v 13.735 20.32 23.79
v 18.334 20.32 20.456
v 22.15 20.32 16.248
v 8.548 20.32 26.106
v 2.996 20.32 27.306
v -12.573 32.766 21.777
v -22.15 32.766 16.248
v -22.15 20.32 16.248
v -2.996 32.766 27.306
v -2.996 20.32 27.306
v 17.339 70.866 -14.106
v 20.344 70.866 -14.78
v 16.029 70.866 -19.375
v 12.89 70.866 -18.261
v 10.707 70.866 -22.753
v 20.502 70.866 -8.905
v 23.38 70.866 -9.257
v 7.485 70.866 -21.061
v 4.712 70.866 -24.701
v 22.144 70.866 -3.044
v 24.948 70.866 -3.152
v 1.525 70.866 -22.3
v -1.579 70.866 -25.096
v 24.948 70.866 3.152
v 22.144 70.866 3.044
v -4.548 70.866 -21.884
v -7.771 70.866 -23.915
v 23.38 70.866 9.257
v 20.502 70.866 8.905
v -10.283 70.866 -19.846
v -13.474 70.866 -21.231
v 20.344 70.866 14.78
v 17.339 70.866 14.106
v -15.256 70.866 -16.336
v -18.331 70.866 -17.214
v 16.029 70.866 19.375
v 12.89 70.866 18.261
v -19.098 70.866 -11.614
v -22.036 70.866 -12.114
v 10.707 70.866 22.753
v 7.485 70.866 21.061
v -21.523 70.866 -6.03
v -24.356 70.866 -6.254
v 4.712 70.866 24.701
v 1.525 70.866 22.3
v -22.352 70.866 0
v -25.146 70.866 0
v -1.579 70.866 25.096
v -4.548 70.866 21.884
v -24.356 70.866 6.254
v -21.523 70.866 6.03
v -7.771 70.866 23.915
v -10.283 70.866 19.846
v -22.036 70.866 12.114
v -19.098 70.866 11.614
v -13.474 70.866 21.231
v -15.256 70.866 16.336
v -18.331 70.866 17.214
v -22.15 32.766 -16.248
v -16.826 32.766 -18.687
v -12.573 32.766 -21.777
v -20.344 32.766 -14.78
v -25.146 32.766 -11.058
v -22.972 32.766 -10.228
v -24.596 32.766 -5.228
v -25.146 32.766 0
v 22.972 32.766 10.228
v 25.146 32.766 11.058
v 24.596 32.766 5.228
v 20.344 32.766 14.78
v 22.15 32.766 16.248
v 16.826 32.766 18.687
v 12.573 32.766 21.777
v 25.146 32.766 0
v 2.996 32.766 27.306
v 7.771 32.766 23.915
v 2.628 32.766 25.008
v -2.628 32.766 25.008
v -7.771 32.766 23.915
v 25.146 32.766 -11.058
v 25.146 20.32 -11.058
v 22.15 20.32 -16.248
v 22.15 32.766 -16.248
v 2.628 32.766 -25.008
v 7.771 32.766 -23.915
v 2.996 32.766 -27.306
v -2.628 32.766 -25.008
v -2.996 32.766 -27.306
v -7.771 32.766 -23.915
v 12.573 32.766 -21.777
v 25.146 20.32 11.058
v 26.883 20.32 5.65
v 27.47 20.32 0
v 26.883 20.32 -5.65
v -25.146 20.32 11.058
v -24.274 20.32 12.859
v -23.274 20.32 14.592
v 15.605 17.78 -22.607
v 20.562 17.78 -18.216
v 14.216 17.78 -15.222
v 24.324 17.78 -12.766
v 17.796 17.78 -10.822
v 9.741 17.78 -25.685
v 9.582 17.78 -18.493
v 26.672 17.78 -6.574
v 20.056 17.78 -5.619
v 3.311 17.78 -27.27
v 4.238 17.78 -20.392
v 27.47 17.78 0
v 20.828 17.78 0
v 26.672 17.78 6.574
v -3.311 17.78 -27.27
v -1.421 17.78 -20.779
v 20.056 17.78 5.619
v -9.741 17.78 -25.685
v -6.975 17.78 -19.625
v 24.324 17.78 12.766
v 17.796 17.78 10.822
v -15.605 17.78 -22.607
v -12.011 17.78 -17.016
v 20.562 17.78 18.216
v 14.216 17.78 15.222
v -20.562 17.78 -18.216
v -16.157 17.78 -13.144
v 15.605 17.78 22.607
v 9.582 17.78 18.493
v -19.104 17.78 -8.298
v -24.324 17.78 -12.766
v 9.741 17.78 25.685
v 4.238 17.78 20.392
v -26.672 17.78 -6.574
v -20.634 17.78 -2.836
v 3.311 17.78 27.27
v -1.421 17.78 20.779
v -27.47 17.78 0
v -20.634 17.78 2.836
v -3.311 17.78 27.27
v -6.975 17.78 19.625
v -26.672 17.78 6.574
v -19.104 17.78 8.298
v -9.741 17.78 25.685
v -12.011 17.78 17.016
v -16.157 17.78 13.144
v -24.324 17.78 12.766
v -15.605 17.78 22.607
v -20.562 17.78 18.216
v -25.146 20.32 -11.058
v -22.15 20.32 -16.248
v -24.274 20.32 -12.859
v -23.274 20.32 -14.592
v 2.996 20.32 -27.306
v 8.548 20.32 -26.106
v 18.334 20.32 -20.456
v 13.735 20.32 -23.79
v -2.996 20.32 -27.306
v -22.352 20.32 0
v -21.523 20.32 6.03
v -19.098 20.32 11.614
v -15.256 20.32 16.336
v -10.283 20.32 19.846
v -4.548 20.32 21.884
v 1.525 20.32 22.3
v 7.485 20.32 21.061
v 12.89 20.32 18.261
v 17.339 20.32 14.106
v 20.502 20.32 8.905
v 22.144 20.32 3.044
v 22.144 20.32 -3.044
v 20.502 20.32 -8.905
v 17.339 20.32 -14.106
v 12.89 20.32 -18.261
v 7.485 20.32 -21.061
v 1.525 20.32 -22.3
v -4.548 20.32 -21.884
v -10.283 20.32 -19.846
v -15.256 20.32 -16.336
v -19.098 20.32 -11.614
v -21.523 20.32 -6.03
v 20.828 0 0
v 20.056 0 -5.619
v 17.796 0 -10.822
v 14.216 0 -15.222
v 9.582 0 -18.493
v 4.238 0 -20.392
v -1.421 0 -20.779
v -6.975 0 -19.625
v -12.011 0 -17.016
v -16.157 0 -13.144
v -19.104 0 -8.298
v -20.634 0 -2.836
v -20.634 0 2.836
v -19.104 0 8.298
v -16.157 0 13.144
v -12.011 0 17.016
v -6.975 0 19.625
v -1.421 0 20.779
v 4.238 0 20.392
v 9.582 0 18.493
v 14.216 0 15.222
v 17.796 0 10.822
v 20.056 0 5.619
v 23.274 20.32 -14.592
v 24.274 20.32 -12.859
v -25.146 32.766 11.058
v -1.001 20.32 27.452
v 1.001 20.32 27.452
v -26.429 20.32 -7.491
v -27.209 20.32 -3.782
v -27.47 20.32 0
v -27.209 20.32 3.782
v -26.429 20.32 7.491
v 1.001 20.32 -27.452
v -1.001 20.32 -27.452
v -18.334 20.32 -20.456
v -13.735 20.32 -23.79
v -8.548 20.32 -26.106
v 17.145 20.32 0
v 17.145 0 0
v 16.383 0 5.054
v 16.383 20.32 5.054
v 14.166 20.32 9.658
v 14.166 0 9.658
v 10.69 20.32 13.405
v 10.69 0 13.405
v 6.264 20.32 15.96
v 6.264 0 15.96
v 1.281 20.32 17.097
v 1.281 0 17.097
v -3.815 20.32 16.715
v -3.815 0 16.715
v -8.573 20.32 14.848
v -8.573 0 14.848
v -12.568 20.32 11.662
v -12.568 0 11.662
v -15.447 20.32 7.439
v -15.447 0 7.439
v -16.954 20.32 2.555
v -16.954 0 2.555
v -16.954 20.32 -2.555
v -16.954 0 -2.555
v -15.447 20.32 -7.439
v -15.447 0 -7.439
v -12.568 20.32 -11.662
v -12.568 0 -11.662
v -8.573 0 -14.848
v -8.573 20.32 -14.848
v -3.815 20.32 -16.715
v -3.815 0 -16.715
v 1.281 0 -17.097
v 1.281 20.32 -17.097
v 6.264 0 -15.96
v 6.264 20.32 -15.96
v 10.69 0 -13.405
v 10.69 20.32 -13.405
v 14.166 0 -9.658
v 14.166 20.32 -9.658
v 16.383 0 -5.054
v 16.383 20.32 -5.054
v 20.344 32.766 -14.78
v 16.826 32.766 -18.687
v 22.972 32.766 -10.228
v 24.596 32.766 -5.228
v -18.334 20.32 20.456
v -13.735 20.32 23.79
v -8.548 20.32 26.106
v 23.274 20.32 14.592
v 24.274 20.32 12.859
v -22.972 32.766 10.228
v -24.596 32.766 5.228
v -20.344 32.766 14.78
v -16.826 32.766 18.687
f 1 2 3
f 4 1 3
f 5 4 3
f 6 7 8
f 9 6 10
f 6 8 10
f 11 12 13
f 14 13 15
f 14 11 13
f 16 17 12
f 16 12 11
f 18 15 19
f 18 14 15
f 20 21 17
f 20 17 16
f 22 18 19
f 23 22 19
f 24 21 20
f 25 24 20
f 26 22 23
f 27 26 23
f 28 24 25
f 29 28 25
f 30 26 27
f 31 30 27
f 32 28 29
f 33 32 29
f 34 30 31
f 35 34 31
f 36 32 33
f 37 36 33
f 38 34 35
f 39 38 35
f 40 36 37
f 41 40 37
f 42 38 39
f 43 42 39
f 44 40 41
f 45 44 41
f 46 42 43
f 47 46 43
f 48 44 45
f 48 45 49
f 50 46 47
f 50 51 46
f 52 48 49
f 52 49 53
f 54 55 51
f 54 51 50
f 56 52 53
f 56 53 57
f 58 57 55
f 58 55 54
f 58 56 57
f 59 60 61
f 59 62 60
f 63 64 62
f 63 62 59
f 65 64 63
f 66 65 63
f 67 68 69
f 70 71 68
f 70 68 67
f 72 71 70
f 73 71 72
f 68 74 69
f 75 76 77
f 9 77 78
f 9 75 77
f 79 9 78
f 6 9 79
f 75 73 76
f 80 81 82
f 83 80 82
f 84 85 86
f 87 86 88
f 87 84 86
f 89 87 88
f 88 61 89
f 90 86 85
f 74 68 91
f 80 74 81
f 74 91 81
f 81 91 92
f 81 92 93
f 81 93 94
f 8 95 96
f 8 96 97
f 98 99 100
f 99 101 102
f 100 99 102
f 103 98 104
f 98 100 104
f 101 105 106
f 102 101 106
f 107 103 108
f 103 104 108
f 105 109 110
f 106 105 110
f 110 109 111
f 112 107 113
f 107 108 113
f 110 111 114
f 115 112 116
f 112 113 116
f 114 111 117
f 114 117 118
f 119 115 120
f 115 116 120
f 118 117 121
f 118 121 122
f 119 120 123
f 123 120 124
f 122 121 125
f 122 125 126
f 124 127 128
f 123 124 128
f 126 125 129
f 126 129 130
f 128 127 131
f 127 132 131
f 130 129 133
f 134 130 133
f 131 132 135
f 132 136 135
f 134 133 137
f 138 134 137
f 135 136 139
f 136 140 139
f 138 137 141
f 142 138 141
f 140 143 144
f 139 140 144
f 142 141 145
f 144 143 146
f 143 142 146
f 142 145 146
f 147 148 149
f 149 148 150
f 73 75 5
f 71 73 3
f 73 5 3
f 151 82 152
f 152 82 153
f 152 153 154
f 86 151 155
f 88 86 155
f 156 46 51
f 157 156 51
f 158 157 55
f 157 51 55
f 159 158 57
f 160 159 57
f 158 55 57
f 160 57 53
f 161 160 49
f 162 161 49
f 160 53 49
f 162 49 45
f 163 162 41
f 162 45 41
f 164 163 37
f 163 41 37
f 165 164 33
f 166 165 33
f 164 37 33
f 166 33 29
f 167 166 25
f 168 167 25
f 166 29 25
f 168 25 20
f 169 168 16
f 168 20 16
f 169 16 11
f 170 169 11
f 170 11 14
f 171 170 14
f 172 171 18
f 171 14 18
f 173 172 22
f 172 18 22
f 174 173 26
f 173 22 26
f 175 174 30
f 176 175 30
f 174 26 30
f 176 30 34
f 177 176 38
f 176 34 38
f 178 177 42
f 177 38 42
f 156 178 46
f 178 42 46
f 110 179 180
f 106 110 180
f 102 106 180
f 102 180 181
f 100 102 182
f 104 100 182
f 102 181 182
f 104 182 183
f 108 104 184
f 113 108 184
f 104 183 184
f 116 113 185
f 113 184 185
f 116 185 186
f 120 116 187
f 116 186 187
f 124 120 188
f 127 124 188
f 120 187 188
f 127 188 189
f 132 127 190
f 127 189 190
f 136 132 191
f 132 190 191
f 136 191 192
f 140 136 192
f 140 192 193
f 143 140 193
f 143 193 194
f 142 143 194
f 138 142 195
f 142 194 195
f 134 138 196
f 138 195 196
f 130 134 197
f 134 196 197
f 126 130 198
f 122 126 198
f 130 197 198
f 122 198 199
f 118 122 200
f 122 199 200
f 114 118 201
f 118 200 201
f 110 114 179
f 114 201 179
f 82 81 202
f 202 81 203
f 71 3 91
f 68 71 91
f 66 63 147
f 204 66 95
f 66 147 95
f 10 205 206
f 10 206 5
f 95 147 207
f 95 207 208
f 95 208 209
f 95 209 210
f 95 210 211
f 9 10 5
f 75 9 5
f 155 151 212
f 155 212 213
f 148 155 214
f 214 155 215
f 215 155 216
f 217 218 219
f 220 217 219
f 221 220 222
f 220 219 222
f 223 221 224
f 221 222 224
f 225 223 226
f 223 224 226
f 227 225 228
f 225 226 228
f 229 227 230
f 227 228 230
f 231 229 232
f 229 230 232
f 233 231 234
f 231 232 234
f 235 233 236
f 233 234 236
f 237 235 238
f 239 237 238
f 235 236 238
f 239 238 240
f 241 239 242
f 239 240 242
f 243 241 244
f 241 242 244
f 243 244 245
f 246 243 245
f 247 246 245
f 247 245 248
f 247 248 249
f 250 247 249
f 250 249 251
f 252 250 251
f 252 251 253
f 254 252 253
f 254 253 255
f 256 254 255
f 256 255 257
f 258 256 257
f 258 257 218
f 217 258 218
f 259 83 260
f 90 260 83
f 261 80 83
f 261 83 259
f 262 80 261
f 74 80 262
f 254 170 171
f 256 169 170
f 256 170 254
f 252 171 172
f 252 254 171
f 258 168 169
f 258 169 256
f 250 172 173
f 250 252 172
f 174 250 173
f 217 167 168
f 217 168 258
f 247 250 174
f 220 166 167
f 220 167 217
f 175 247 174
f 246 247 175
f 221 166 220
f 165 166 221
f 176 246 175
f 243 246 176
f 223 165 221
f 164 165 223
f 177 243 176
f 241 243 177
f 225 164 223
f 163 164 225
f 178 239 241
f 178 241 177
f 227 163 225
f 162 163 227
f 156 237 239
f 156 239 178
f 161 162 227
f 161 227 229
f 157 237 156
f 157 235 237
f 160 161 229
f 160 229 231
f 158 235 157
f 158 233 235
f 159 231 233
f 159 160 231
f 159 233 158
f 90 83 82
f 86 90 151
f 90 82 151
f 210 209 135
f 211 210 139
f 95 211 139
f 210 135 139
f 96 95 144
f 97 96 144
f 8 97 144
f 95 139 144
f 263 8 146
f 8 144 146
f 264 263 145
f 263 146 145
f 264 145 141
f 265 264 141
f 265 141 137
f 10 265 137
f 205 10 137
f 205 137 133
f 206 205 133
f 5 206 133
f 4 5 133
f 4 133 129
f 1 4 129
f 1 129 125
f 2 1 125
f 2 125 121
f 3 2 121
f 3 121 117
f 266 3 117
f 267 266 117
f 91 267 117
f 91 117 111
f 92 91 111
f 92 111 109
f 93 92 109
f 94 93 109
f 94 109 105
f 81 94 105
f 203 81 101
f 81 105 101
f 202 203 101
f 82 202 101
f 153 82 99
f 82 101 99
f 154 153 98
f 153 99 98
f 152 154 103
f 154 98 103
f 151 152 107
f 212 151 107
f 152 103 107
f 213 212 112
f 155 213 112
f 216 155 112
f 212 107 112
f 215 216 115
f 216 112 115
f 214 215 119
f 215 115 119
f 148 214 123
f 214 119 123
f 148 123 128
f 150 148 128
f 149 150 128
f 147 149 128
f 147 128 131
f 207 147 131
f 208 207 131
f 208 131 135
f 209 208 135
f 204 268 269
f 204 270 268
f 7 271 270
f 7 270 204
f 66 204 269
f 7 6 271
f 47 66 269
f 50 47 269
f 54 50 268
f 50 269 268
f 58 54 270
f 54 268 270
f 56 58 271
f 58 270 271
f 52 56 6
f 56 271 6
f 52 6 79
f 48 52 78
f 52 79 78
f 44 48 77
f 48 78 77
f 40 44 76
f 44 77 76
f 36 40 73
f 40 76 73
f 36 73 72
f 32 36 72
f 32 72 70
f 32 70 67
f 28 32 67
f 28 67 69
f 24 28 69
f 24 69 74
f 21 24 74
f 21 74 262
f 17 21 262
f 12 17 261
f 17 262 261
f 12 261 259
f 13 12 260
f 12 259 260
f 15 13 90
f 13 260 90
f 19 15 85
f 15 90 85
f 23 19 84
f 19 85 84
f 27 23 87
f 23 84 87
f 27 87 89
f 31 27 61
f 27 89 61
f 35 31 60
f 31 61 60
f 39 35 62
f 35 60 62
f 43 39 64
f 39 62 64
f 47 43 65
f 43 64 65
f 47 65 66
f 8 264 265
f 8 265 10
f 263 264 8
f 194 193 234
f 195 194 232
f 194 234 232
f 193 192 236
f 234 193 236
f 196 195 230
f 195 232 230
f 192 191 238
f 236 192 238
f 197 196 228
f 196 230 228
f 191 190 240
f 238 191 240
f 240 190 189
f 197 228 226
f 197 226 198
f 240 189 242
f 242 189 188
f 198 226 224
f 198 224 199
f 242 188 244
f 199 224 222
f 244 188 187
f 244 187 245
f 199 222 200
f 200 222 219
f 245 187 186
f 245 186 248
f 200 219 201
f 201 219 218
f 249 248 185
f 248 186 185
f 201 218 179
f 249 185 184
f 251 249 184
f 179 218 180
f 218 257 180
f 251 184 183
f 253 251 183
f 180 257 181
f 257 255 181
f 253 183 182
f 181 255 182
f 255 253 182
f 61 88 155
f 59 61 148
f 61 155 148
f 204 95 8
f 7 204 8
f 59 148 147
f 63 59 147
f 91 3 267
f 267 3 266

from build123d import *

# Parameters (mm, degrees)
SKETCH2_R           = 20.828
BASE_EXTRUDE_DEPTH  = 17.78
SKETCH3_R           = 27.4701
BOSS_EXTRUDE1_DEPTH = 2.54
BOSS_EXTRUDE3_DEPTH = 12.446
SKETCH6_R           = 25.146
BOSS_EXTRUDE4_DEPTH = 38.1
SKETCH7_R           = 22.352
CUT_EXTRUDE1_DEPTH  = 50.546
SKETCH8_R           = 17.145
CUT_EXTRUDE2_DEPTH  = 71.866


with BuildPart() as part:
    # Sketch2 → Base-Extrude (new body)
    with BuildSketch(Plane(origin=(0, 0, 0), x_dir=(1, 0, 0), z_dir=(0, 1, 0))):
        Circle(SKETCH2_R)
    extrude(amount=BASE_EXTRUDE_DEPTH)

    # Sketch3 → Boss-Extrude1 (add)
    with BuildSketch(Plane(origin=(0, 17.78, 0), x_dir=(-1, 0, 0), z_dir=(0, 1, 0))):
        Circle(SKETCH3_R)
    extrude(amount=BOSS_EXTRUDE1_DEPTH)

    # Sketch5 → Boss-Extrude3 (add)
    with BuildSketch(Plane(origin=(0, 20.32, 0), x_dir=(-1, 0, 0), z_dir=(0, 1, 0))):
        Polygon((25.146, -11.058258362), (25.146, 11.058258362), (22.149732663, 16.247945622), (2.996267337, 27.306203985), (-2.996267337, 27.306203985), (-22.149732663, 16.247945622), (-25.146, 11.058258362), (-25.146, -11.058258362), (-22.149732663, -16.247945622), (-2.996267337, -27.306203985), (2.996267337, -27.306203985), (22.149732663, -16.247945622), align=None)
    extrude(amount=BOSS_EXTRUDE3_DEPTH)

    # Sketch6 → Boss-Extrude4 (add)
    with BuildSketch(Plane(origin=(0, 32.766, 0), x_dir=(-1, 0, 0), z_dir=(0, 1, 0))):
        Circle(SKETCH6_R)
    extrude(amount=BOSS_EXTRUDE4_DEPTH)

    # Sketch7 → Cut-Extrude1 (cut)
    with BuildSketch(Plane(origin=(0, 70.866, 0), x_dir=(-1, 0, 0), z_dir=(0, 1, 0))):
        Circle(SKETCH7_R)
    extrude(amount=-CUT_EXTRUDE1_DEPTH, mode=Mode.SUBTRACT)

    # Sketch8 → Cut-Extrude2 (cut, through all)
    with BuildSketch(Plane.XZ):
        Circle(SKETCH8_R)
    extrude(amount=-CUT_EXTRUDE2_DEPTH, mode=Mode.SUBTRACT)


solid = part.part
